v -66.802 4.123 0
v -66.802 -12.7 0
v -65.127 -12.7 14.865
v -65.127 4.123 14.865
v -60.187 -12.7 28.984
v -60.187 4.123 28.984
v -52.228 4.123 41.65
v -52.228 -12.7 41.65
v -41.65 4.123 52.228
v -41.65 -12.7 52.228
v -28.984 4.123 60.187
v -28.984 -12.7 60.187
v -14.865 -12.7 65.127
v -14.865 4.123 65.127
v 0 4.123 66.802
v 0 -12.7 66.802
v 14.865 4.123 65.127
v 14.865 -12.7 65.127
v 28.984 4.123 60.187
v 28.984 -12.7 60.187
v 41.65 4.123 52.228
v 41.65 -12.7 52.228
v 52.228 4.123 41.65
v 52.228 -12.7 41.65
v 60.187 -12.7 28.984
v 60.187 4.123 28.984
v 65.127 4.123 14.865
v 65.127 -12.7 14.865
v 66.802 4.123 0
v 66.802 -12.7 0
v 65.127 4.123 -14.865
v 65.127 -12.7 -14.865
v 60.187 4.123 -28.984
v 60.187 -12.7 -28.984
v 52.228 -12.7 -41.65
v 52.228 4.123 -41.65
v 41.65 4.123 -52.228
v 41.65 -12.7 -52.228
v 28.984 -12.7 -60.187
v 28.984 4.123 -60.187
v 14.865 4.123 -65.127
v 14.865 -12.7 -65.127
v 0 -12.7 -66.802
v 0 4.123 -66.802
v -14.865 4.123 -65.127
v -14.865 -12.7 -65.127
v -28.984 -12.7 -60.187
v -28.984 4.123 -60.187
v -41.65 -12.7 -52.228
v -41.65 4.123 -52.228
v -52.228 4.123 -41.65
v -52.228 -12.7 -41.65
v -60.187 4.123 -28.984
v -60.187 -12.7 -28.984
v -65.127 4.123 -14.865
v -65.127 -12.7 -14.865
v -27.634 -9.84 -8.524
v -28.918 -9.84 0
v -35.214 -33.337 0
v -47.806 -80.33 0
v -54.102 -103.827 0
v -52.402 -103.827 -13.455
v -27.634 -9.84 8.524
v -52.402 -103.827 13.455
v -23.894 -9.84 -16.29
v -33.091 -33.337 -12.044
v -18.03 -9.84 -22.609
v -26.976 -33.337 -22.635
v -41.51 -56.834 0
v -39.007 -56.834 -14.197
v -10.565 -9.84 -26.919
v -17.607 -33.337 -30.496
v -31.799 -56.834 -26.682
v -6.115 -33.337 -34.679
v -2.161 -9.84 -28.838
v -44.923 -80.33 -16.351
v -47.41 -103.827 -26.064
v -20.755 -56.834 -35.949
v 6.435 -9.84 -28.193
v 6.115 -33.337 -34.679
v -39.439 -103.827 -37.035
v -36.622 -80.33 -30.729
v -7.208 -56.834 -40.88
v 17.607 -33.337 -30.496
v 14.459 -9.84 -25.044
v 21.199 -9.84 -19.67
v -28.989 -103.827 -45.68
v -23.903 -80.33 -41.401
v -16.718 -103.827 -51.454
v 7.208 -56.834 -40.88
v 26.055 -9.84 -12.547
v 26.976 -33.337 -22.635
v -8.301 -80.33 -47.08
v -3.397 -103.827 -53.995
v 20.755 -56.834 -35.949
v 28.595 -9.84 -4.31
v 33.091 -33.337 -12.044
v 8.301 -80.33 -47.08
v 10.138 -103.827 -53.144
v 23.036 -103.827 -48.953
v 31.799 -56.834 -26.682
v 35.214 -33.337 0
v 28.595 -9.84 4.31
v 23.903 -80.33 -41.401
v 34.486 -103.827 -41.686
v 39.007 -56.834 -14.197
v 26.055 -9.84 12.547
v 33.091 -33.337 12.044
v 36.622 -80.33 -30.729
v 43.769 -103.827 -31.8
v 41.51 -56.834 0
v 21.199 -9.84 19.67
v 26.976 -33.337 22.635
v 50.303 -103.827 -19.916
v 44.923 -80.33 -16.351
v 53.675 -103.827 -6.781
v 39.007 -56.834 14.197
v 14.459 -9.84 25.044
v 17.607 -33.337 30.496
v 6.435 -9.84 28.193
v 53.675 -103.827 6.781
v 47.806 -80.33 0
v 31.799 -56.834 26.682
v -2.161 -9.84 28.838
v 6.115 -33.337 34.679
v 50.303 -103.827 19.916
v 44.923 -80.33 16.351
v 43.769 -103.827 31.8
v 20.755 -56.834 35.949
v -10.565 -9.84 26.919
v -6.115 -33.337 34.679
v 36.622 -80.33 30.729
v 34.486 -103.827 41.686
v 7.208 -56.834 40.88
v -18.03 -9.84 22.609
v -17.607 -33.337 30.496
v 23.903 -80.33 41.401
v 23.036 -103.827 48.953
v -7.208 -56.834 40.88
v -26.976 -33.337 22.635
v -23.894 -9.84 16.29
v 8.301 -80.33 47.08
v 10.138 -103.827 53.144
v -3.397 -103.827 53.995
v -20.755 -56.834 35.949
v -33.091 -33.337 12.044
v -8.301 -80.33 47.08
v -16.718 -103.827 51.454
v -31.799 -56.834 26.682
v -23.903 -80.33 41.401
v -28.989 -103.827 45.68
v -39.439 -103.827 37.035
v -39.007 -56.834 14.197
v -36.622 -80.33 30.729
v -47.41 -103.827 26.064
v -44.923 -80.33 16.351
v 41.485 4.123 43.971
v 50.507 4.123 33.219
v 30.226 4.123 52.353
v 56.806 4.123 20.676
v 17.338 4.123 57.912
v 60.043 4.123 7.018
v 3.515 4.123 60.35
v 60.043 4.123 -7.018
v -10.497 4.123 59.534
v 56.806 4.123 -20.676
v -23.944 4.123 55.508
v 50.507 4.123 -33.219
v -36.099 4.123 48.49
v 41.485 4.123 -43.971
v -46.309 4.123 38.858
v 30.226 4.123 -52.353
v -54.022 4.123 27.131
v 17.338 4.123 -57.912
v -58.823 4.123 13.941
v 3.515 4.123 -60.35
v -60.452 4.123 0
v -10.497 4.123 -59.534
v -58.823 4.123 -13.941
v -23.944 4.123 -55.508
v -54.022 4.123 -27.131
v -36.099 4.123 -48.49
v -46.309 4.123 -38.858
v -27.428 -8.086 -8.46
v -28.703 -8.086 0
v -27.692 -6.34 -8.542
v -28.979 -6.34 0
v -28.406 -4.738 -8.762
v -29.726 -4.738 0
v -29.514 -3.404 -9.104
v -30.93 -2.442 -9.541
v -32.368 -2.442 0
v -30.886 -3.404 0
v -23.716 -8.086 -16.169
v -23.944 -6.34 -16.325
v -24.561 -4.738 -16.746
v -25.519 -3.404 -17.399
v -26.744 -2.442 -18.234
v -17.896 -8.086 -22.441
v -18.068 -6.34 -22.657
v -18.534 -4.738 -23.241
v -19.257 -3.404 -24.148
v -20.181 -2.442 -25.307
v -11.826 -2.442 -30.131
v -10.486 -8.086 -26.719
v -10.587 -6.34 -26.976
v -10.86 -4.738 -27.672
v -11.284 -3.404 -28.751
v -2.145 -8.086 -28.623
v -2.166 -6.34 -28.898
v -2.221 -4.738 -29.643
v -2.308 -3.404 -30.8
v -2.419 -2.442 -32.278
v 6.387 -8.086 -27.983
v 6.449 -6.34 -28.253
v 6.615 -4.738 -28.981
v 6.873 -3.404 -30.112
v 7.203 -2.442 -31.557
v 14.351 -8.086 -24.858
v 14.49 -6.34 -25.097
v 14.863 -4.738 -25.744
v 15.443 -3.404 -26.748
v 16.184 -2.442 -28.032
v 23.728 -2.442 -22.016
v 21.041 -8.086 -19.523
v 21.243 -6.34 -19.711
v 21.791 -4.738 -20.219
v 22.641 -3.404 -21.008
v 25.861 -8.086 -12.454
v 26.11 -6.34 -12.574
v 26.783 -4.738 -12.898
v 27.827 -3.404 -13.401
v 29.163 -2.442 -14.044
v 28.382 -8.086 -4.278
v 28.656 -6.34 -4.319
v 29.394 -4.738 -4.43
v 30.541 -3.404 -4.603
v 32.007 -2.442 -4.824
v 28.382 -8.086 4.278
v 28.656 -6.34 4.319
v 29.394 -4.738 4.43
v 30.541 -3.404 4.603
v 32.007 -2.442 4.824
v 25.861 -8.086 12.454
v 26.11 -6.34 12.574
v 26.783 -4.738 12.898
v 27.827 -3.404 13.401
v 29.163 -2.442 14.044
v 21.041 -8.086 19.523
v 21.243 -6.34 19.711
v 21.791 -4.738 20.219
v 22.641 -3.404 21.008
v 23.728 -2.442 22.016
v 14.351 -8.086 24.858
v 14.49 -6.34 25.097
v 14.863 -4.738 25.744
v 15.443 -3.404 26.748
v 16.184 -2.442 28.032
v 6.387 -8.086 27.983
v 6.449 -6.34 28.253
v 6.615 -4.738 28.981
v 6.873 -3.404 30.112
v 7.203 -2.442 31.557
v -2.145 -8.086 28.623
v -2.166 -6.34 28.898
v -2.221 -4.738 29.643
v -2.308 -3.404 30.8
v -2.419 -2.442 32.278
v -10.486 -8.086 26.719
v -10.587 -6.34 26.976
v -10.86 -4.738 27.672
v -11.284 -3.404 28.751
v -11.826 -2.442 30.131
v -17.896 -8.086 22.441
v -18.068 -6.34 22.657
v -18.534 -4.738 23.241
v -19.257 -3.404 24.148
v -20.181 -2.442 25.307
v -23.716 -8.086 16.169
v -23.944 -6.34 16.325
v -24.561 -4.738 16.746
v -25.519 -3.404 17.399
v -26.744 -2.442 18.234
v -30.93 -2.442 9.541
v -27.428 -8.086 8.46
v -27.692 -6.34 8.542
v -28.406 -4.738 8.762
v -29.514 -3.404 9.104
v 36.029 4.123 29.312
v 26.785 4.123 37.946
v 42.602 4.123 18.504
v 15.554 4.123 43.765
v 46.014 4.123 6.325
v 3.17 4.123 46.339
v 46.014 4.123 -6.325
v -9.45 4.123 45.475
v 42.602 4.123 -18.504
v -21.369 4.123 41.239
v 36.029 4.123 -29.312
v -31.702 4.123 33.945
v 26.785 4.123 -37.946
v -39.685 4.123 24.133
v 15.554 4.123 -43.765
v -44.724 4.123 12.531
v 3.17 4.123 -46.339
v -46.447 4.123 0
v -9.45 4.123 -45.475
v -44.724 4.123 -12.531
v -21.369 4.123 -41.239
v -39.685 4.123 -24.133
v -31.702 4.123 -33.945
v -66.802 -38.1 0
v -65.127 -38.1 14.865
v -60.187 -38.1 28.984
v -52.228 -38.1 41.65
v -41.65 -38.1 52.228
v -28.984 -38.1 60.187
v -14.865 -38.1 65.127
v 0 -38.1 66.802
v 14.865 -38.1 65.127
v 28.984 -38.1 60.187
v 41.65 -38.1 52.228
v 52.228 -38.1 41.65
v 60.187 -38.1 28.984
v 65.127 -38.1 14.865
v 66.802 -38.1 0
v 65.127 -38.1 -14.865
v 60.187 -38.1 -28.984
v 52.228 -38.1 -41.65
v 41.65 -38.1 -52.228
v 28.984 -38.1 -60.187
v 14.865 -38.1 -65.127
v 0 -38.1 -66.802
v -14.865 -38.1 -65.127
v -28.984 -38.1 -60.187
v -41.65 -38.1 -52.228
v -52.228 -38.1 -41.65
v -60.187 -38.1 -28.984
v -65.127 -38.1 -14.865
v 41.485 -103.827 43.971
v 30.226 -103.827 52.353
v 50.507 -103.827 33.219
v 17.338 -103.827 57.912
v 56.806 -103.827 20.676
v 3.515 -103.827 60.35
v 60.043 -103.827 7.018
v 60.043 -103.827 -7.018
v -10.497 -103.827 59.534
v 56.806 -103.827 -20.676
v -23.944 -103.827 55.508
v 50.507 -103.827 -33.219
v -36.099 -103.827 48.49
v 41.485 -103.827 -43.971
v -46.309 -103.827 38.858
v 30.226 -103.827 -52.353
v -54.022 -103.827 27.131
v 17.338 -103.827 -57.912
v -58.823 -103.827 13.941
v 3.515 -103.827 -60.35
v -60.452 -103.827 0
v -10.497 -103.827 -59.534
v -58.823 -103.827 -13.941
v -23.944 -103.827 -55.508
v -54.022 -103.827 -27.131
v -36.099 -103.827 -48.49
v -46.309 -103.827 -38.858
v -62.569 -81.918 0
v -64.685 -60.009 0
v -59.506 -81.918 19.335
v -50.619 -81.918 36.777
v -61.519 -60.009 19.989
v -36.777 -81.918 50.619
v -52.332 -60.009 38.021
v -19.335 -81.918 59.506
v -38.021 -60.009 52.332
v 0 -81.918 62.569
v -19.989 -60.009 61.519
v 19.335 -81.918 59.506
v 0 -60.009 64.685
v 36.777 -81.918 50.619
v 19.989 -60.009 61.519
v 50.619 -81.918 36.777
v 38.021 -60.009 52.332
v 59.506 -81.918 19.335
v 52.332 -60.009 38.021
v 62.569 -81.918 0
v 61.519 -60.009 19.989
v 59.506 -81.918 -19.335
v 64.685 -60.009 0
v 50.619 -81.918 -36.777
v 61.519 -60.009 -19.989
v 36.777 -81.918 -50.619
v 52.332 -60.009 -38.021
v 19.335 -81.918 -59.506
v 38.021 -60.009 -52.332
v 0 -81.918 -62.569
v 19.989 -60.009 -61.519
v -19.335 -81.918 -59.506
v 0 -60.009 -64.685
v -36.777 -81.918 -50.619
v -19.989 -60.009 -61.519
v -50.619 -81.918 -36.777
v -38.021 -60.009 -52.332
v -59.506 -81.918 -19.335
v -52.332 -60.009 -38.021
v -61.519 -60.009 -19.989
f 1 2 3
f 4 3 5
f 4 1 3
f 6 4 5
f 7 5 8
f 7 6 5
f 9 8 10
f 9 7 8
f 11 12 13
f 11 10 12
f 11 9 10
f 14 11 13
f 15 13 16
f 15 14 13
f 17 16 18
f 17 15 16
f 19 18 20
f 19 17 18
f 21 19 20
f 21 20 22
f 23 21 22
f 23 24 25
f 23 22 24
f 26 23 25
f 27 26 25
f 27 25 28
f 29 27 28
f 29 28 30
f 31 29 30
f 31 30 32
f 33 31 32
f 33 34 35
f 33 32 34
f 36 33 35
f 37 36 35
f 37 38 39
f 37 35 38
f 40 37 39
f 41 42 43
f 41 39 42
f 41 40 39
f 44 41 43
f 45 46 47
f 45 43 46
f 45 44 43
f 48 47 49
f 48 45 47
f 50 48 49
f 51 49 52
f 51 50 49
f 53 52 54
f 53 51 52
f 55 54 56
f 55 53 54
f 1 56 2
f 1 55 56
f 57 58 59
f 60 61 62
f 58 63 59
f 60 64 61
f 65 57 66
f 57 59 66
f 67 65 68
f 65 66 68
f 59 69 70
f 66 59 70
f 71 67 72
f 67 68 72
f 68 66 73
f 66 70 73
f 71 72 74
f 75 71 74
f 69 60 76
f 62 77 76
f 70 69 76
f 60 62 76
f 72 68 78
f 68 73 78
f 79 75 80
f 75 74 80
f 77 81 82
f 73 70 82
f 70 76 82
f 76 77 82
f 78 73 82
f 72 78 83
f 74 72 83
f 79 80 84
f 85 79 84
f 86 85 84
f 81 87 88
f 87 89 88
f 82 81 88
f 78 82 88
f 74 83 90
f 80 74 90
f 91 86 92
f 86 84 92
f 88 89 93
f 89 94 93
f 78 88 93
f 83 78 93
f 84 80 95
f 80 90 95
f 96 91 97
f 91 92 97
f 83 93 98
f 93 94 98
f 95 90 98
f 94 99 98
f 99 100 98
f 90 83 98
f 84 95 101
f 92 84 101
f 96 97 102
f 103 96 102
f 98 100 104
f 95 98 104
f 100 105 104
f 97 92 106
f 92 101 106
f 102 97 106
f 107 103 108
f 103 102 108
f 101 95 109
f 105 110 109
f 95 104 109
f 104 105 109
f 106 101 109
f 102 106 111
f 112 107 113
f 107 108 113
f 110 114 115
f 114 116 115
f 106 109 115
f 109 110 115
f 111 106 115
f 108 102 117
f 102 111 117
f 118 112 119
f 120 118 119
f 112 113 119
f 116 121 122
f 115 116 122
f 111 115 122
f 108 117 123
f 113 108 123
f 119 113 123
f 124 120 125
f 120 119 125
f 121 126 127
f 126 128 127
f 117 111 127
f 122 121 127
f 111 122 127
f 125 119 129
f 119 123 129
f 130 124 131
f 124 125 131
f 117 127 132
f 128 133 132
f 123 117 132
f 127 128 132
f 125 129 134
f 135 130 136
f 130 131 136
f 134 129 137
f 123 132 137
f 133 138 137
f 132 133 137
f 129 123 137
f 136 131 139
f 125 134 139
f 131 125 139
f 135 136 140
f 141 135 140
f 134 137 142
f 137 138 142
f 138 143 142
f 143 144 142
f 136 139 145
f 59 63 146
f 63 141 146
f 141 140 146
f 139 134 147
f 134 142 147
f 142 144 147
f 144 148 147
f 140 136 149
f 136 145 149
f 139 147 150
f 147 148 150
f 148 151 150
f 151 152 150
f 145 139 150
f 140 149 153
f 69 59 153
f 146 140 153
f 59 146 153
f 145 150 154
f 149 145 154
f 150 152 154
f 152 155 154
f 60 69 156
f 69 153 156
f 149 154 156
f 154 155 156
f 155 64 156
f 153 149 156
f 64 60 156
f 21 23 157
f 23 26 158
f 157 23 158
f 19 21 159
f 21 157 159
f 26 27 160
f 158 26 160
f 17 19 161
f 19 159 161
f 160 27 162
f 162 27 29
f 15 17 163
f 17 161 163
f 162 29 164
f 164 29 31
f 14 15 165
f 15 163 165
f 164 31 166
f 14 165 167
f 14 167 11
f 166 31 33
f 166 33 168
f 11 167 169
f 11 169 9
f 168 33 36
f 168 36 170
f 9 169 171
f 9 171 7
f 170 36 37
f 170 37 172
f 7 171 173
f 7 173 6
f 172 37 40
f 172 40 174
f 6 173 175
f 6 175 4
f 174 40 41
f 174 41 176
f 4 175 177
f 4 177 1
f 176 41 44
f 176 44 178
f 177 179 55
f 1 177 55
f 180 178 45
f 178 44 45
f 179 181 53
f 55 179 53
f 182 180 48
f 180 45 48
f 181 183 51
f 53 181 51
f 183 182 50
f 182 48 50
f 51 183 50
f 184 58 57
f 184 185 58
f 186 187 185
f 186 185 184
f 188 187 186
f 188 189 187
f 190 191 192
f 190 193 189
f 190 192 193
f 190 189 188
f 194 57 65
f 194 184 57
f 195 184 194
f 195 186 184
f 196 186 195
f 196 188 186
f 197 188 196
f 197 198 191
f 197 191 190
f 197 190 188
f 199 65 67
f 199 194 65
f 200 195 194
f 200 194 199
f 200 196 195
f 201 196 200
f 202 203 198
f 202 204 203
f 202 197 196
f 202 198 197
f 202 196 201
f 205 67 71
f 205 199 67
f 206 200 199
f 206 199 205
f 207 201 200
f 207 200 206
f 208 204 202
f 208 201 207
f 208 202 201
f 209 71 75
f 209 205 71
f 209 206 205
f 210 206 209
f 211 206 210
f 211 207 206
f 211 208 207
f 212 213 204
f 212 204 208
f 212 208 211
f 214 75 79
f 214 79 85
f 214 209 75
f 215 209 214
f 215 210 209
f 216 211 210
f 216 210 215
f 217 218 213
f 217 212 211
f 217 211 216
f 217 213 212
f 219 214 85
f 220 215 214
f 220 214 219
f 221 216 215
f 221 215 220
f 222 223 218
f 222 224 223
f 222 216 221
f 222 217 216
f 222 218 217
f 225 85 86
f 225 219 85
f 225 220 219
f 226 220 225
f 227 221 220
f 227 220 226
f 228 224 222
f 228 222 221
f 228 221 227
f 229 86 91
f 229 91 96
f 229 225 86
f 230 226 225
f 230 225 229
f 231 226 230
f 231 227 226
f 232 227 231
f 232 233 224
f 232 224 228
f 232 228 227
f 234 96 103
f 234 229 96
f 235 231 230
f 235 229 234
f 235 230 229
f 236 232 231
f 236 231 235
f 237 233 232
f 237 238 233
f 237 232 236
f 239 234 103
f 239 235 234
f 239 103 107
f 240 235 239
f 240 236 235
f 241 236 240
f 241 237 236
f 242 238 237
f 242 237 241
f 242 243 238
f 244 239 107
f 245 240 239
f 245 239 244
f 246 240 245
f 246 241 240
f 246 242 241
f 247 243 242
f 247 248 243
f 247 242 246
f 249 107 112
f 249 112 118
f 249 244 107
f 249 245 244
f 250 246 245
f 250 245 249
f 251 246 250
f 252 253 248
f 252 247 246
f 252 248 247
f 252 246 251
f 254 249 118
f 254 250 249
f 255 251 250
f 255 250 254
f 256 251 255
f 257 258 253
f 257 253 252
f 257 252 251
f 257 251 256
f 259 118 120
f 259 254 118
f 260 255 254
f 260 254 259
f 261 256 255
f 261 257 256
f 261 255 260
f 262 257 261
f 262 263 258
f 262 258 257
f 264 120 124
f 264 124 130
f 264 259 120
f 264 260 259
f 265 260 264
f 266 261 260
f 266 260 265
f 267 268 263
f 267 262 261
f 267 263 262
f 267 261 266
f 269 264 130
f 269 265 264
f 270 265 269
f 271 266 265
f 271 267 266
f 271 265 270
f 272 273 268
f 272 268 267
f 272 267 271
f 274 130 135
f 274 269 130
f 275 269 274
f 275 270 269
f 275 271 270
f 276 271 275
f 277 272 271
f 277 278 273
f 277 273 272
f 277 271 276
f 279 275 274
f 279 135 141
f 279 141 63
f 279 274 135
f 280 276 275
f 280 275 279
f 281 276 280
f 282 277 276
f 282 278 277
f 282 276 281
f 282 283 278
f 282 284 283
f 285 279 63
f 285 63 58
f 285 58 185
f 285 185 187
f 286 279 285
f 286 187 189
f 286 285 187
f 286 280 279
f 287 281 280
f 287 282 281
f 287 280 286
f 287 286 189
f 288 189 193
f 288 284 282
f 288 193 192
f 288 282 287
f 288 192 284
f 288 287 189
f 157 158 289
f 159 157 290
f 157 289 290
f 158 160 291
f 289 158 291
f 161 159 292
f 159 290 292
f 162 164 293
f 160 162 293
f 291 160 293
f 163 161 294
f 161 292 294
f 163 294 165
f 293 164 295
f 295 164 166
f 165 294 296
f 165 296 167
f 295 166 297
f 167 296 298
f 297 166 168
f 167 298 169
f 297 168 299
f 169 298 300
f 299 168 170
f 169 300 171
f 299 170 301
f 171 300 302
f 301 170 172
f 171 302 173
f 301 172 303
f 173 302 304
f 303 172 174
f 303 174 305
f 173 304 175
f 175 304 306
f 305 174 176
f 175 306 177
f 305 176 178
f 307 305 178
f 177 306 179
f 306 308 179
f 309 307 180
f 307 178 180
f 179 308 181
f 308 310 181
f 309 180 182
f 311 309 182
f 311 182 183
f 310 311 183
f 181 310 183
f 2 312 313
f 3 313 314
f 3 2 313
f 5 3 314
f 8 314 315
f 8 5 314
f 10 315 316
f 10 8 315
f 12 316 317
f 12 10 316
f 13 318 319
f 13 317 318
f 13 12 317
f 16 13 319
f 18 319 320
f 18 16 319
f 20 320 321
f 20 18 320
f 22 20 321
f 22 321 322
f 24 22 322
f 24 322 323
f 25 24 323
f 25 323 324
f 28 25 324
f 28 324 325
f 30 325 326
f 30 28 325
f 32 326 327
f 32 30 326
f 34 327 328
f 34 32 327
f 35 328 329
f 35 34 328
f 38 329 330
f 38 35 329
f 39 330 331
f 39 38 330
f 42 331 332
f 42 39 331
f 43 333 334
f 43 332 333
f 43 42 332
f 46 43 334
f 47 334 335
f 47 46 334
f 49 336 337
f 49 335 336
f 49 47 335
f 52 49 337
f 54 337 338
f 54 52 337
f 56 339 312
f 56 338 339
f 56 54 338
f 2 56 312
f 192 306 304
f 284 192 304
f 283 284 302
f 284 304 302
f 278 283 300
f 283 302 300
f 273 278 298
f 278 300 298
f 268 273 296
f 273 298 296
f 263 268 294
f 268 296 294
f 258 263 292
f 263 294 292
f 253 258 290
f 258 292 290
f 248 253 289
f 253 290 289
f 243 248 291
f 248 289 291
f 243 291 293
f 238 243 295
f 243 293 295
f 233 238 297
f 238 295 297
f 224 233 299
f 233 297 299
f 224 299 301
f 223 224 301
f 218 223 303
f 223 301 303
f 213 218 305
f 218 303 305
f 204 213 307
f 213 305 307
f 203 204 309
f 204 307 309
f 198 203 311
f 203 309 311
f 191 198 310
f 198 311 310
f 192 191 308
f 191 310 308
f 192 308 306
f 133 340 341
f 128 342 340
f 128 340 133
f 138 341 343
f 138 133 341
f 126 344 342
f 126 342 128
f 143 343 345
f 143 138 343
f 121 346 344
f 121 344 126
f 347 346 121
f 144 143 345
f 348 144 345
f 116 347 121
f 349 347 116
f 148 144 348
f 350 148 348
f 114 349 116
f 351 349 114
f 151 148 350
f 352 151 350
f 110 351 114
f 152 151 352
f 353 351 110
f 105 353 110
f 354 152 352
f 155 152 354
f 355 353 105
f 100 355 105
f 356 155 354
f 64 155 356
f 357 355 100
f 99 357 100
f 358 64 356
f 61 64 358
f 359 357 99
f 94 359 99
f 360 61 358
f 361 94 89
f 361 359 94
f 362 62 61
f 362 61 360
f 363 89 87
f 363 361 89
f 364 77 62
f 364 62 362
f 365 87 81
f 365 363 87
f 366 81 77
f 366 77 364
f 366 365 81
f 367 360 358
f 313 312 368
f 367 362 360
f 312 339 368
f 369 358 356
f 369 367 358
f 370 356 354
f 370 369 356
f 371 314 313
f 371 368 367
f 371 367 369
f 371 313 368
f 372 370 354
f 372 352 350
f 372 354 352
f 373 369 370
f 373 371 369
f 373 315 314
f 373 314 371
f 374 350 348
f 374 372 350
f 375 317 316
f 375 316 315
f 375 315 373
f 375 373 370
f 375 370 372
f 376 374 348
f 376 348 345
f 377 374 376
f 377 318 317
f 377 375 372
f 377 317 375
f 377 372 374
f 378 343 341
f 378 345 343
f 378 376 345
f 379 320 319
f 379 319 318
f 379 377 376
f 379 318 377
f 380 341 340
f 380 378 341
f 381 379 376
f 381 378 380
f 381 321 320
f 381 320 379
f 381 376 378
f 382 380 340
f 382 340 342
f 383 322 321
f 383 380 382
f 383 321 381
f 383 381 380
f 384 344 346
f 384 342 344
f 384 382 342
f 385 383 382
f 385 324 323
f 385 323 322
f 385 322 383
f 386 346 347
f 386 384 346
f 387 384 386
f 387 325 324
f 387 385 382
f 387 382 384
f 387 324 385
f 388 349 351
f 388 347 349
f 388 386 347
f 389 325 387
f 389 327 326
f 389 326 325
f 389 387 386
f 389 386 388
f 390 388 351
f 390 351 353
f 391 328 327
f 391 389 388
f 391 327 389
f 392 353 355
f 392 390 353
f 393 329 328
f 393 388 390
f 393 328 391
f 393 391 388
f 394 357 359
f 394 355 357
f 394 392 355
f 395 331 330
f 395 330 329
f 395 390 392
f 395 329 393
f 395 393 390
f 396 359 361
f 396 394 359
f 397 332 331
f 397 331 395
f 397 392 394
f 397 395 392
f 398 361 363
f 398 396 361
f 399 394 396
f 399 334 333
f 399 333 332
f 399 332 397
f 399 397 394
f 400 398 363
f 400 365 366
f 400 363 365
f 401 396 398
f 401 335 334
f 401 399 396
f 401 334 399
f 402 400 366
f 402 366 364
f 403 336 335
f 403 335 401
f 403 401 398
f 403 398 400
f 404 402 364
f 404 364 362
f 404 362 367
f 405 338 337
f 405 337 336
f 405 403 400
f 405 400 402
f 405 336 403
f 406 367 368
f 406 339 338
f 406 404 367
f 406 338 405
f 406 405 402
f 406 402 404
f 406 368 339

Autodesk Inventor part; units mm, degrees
ref_plane "YZ Plane" through (0, 0, 0) normal (1, 0, 0) x (0, 1, 0)
ref_plane "XZ Plane" through (0, 0, 0) normal (0, 1, 0) x (-1, 0, 0)
ref_plane "XY Plane" through (0, 0, 0) normal (0, 0, 1) x (1, 0, 0)
sketch "Sketch1" plane through (0, 0, 0) normal (0, 0, 1) x (1, 0, 0)
  line L0 (0, 25.4) -> (-28.702, 25.4) construction
  line L1 (0, 25.4) -> (-95.25, 25.4) construction
  line L2 (-95.25, 25.4) -> (-92.075, 25.4) construction
  line L3 (-92.075, 25.4) -> (-84.455, 21.8467) construction
  line L4 (-92.075, 25.4) -> (-92.075, 22.4389) construction
  line L5 (-92.075, 0) -> (-95.25, 0)
  line L6 (-28.702, 59.0535) -> (-28.702, -92.5226) construction
  arc A0 (-28.9184, -9.8402) -> (-32.3684, -2.4417) centre (-35.052, -8.1967) ccw
  line L7 (-76.2, -186.2977) -> (-28.702, -9.0327)
  line L8 (-92.075, 25.4) -> (-92.075, 0)
  line L9 (-92.075, 25.4) -> (-32.3684, -2.4417)
  line L10 (-28.702, -8.1967) -> (-60.452, -8.1967) construction
  line L11 (-60.452, -127.5253) -> (-54.102, -127.5253) construction
  line L12 (-54.102, -127.5253) -> (-54.102, -103.8268) construction
  line L13 (-54.102, -103.8268) -> (-60.452, -103.8268)
  line L14 (-60.452, 10.654) -> (-60.452, 1.129) construction
  line L15 (-60.452, 10.654) -> (-60.452, 4.1232) construction
  line L16 (-60.452, 4.1232) -> (-46.4468, 4.1232)
  line L17 (-95.25, 0) -> (-95.25, -12.7) construction
  line L18 (-60.452, -12.7) -> (-73.152, -12.7) construction
  line L19 (-95.25, -12.7) -> (-95.25, -25.4) construction
  line L20 (-95.25, -25.4) -> (-95.25, -88.9) construction
  line L21 (-95.25, -88.9) -> (-82.55, -88.9) construction
  line L22 (-82.55, -88.9) -> (-82.55, -25.4) construction
  line L23 (-95.25, -25.4) -> (-82.55, -25.4)
  line L24 (-82.55, -25.4) -> (-82.55, -88.9)
  line L25 (-82.55, -88.9) -> (-95.25, -88.9)
  line L26 (-95.25, -12.7) -> (-73.152, -12.7)
  line L27 (-73.152, -139.3746) -> (-63.627, -139.3746)
  line L28 (-82.55, -88.9) -> (-82.55, -186.2977)
  line L29 (-82.55, -186.2977) -> (-76.2, -186.2977)
  line L30 (-73.152, -12.7) -> (-73.152, -139.3746)
  line L31 (-88.9, -25.4) -> (-88.9, -31.3436)
  line L32 (-88.9, -31.3436) -> (-95.25, -31.3436)
  line L33 (-95.25, 0) -> (-95.25, -25.4)
  line L34 (-95.25, -31.3436) -> (-95.25, -88.9)
  line L35 (-88.9, -160.8977) -> (-88.9, -221.8454)
  line L36 (-28.9184, -9.8402) -> (-85.725, -221.8454)
  line L37 (-85.725, -221.8454) -> (-88.9, -221.8454)
  line L38 (-82.55, -160.8977) -> (-88.9, -160.8977)
  line L39 (-66.802, -38.1) -> (-66.802, 4.1232)
  line L40 (-66.802, 4.1232) -> (-60.452, 4.1232)
  line L41 (-66.802, -38.1) -> (-60.452, -103.8268)
  line L42 (-60.452, 10.654) -> (-60.452, 4.1232) construction
  line L43 (-60.452, -8.1967) -> (-60.452, -12.7) construction
  line L44 (-60.452, -103.8268) -> (-60.452, -127.5253) construction
  line L45 (0, 59.6457) -> (0, -91.9304) construction
  line L46 (-73.152, -38.1) -> (-69.977, -38.1)
  line L47 (-69.977, -38.1) -> (-69.977, -12.7)
  line L48 (-66.802, -12.7) -> (-69.977, -12.7)
  point P0 (0, 0)
  point P1 (-95.25, -256.5049)
  point P2 (-88.7095, 22.4389)
  dimension "d0" = 28.702
  dimension "d1" = 95.25
  dimension "d2" = 3.175
  dimension "d3" = 25
  dimension "d5" = 25.4
  dimension "d6" = 25.4
  dimension "d8" = 12.7
  dimension "d12" = 31.75
  dimension "d13" = 6.35
  dimension "d16" = 12.7
  dimension "d17" = 12.7
  dimension "d18" = 12.7
  dimension "d19" = 63.5
  dimension "d20" = 12.7
  dimension "d22" = 9.525
  dimension "d23" = 6.35
  dimension "d25" = 5.9436
  dimension "d27" = 3.175
  dimension "d28" = 6.35
  dimension "d29" = 25.4
  dimension "d30" = 107.95
  dimension "d31" = 6.35
  dimension "d33" = 20.3552
  dimension "d34" = 15
  dimension "d35" = 3.175
  dimension "d36" = 25.4
revolve "Revolution2" add sketch "Sketch1" angle 360 about axis through (0, 59.6457, 0) along (0, -1, 0) contours L9 A0 L7 L13 L41 L39 L40 L16
properties part number "graphite" material "Graphite"
